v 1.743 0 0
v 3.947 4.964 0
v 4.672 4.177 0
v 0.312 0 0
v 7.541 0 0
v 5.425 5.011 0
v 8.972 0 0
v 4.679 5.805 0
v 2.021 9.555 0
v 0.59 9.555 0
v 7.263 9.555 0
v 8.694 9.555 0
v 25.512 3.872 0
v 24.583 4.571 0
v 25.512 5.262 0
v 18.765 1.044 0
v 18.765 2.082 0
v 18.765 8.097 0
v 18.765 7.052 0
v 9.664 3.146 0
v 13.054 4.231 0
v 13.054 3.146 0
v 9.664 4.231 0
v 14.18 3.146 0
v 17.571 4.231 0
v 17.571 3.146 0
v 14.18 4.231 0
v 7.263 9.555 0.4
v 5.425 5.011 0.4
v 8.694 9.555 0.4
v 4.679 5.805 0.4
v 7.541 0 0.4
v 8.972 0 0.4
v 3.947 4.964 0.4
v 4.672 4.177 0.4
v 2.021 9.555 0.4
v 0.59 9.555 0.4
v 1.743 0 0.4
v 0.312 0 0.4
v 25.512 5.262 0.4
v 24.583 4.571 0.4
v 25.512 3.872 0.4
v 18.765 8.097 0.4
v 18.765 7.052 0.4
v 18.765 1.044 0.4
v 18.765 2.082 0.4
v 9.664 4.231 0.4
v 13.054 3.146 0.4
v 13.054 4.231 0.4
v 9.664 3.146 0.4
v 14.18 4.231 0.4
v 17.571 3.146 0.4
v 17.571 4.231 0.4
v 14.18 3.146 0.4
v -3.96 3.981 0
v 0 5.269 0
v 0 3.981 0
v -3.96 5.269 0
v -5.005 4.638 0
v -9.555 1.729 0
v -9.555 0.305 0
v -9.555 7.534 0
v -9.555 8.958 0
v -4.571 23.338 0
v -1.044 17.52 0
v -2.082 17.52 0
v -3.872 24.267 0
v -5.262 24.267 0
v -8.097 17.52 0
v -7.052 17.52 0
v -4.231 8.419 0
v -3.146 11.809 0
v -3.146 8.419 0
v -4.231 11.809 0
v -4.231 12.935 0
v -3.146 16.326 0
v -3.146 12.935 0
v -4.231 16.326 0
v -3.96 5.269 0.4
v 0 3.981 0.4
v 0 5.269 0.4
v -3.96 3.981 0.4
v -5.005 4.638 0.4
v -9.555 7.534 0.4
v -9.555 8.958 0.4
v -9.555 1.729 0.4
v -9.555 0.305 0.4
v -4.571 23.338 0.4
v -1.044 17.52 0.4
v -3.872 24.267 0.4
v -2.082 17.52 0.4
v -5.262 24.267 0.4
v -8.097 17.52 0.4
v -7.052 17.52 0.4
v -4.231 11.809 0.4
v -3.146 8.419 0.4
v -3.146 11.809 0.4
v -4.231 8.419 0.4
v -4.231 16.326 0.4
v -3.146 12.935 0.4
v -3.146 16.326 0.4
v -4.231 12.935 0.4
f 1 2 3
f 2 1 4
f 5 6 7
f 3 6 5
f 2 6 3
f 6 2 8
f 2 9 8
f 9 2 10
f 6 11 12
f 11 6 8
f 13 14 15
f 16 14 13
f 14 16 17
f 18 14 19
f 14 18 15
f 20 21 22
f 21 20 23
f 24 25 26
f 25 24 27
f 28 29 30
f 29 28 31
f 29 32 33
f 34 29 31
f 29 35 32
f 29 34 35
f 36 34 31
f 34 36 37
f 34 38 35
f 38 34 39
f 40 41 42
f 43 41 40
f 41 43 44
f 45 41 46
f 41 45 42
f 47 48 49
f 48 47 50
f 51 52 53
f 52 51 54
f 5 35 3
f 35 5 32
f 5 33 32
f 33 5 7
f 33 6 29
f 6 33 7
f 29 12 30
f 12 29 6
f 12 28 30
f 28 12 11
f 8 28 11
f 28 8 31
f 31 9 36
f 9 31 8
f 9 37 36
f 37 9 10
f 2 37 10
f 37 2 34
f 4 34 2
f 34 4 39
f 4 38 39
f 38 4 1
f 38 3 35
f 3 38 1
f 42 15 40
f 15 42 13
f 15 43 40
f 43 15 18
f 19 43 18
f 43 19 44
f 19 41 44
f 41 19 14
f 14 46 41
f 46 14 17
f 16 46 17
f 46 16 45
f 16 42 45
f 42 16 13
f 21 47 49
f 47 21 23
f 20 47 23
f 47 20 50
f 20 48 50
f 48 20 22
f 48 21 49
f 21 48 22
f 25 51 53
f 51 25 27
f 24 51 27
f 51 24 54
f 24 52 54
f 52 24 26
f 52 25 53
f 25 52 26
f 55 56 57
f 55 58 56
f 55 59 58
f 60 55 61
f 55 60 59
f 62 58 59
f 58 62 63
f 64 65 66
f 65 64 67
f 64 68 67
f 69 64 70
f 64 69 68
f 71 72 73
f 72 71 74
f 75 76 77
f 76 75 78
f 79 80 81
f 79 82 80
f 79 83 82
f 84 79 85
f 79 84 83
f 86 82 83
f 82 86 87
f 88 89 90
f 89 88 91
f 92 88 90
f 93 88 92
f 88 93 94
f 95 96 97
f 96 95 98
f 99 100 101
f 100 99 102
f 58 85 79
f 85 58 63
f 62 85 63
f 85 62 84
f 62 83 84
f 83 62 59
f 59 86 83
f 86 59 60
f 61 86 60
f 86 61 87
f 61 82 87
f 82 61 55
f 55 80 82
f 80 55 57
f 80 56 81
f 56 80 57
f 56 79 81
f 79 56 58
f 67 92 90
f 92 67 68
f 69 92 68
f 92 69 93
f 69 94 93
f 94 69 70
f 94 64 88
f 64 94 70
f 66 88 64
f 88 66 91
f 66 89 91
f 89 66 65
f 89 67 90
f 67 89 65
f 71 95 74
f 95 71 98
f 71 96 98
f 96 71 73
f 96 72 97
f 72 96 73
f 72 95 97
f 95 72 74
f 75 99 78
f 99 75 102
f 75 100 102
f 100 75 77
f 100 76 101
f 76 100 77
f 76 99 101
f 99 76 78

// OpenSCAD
linear_extrude(0.4)
	text("X-->");
rotate([0,0,90])
linear_extrude(0.4)
	text("Y-->");
